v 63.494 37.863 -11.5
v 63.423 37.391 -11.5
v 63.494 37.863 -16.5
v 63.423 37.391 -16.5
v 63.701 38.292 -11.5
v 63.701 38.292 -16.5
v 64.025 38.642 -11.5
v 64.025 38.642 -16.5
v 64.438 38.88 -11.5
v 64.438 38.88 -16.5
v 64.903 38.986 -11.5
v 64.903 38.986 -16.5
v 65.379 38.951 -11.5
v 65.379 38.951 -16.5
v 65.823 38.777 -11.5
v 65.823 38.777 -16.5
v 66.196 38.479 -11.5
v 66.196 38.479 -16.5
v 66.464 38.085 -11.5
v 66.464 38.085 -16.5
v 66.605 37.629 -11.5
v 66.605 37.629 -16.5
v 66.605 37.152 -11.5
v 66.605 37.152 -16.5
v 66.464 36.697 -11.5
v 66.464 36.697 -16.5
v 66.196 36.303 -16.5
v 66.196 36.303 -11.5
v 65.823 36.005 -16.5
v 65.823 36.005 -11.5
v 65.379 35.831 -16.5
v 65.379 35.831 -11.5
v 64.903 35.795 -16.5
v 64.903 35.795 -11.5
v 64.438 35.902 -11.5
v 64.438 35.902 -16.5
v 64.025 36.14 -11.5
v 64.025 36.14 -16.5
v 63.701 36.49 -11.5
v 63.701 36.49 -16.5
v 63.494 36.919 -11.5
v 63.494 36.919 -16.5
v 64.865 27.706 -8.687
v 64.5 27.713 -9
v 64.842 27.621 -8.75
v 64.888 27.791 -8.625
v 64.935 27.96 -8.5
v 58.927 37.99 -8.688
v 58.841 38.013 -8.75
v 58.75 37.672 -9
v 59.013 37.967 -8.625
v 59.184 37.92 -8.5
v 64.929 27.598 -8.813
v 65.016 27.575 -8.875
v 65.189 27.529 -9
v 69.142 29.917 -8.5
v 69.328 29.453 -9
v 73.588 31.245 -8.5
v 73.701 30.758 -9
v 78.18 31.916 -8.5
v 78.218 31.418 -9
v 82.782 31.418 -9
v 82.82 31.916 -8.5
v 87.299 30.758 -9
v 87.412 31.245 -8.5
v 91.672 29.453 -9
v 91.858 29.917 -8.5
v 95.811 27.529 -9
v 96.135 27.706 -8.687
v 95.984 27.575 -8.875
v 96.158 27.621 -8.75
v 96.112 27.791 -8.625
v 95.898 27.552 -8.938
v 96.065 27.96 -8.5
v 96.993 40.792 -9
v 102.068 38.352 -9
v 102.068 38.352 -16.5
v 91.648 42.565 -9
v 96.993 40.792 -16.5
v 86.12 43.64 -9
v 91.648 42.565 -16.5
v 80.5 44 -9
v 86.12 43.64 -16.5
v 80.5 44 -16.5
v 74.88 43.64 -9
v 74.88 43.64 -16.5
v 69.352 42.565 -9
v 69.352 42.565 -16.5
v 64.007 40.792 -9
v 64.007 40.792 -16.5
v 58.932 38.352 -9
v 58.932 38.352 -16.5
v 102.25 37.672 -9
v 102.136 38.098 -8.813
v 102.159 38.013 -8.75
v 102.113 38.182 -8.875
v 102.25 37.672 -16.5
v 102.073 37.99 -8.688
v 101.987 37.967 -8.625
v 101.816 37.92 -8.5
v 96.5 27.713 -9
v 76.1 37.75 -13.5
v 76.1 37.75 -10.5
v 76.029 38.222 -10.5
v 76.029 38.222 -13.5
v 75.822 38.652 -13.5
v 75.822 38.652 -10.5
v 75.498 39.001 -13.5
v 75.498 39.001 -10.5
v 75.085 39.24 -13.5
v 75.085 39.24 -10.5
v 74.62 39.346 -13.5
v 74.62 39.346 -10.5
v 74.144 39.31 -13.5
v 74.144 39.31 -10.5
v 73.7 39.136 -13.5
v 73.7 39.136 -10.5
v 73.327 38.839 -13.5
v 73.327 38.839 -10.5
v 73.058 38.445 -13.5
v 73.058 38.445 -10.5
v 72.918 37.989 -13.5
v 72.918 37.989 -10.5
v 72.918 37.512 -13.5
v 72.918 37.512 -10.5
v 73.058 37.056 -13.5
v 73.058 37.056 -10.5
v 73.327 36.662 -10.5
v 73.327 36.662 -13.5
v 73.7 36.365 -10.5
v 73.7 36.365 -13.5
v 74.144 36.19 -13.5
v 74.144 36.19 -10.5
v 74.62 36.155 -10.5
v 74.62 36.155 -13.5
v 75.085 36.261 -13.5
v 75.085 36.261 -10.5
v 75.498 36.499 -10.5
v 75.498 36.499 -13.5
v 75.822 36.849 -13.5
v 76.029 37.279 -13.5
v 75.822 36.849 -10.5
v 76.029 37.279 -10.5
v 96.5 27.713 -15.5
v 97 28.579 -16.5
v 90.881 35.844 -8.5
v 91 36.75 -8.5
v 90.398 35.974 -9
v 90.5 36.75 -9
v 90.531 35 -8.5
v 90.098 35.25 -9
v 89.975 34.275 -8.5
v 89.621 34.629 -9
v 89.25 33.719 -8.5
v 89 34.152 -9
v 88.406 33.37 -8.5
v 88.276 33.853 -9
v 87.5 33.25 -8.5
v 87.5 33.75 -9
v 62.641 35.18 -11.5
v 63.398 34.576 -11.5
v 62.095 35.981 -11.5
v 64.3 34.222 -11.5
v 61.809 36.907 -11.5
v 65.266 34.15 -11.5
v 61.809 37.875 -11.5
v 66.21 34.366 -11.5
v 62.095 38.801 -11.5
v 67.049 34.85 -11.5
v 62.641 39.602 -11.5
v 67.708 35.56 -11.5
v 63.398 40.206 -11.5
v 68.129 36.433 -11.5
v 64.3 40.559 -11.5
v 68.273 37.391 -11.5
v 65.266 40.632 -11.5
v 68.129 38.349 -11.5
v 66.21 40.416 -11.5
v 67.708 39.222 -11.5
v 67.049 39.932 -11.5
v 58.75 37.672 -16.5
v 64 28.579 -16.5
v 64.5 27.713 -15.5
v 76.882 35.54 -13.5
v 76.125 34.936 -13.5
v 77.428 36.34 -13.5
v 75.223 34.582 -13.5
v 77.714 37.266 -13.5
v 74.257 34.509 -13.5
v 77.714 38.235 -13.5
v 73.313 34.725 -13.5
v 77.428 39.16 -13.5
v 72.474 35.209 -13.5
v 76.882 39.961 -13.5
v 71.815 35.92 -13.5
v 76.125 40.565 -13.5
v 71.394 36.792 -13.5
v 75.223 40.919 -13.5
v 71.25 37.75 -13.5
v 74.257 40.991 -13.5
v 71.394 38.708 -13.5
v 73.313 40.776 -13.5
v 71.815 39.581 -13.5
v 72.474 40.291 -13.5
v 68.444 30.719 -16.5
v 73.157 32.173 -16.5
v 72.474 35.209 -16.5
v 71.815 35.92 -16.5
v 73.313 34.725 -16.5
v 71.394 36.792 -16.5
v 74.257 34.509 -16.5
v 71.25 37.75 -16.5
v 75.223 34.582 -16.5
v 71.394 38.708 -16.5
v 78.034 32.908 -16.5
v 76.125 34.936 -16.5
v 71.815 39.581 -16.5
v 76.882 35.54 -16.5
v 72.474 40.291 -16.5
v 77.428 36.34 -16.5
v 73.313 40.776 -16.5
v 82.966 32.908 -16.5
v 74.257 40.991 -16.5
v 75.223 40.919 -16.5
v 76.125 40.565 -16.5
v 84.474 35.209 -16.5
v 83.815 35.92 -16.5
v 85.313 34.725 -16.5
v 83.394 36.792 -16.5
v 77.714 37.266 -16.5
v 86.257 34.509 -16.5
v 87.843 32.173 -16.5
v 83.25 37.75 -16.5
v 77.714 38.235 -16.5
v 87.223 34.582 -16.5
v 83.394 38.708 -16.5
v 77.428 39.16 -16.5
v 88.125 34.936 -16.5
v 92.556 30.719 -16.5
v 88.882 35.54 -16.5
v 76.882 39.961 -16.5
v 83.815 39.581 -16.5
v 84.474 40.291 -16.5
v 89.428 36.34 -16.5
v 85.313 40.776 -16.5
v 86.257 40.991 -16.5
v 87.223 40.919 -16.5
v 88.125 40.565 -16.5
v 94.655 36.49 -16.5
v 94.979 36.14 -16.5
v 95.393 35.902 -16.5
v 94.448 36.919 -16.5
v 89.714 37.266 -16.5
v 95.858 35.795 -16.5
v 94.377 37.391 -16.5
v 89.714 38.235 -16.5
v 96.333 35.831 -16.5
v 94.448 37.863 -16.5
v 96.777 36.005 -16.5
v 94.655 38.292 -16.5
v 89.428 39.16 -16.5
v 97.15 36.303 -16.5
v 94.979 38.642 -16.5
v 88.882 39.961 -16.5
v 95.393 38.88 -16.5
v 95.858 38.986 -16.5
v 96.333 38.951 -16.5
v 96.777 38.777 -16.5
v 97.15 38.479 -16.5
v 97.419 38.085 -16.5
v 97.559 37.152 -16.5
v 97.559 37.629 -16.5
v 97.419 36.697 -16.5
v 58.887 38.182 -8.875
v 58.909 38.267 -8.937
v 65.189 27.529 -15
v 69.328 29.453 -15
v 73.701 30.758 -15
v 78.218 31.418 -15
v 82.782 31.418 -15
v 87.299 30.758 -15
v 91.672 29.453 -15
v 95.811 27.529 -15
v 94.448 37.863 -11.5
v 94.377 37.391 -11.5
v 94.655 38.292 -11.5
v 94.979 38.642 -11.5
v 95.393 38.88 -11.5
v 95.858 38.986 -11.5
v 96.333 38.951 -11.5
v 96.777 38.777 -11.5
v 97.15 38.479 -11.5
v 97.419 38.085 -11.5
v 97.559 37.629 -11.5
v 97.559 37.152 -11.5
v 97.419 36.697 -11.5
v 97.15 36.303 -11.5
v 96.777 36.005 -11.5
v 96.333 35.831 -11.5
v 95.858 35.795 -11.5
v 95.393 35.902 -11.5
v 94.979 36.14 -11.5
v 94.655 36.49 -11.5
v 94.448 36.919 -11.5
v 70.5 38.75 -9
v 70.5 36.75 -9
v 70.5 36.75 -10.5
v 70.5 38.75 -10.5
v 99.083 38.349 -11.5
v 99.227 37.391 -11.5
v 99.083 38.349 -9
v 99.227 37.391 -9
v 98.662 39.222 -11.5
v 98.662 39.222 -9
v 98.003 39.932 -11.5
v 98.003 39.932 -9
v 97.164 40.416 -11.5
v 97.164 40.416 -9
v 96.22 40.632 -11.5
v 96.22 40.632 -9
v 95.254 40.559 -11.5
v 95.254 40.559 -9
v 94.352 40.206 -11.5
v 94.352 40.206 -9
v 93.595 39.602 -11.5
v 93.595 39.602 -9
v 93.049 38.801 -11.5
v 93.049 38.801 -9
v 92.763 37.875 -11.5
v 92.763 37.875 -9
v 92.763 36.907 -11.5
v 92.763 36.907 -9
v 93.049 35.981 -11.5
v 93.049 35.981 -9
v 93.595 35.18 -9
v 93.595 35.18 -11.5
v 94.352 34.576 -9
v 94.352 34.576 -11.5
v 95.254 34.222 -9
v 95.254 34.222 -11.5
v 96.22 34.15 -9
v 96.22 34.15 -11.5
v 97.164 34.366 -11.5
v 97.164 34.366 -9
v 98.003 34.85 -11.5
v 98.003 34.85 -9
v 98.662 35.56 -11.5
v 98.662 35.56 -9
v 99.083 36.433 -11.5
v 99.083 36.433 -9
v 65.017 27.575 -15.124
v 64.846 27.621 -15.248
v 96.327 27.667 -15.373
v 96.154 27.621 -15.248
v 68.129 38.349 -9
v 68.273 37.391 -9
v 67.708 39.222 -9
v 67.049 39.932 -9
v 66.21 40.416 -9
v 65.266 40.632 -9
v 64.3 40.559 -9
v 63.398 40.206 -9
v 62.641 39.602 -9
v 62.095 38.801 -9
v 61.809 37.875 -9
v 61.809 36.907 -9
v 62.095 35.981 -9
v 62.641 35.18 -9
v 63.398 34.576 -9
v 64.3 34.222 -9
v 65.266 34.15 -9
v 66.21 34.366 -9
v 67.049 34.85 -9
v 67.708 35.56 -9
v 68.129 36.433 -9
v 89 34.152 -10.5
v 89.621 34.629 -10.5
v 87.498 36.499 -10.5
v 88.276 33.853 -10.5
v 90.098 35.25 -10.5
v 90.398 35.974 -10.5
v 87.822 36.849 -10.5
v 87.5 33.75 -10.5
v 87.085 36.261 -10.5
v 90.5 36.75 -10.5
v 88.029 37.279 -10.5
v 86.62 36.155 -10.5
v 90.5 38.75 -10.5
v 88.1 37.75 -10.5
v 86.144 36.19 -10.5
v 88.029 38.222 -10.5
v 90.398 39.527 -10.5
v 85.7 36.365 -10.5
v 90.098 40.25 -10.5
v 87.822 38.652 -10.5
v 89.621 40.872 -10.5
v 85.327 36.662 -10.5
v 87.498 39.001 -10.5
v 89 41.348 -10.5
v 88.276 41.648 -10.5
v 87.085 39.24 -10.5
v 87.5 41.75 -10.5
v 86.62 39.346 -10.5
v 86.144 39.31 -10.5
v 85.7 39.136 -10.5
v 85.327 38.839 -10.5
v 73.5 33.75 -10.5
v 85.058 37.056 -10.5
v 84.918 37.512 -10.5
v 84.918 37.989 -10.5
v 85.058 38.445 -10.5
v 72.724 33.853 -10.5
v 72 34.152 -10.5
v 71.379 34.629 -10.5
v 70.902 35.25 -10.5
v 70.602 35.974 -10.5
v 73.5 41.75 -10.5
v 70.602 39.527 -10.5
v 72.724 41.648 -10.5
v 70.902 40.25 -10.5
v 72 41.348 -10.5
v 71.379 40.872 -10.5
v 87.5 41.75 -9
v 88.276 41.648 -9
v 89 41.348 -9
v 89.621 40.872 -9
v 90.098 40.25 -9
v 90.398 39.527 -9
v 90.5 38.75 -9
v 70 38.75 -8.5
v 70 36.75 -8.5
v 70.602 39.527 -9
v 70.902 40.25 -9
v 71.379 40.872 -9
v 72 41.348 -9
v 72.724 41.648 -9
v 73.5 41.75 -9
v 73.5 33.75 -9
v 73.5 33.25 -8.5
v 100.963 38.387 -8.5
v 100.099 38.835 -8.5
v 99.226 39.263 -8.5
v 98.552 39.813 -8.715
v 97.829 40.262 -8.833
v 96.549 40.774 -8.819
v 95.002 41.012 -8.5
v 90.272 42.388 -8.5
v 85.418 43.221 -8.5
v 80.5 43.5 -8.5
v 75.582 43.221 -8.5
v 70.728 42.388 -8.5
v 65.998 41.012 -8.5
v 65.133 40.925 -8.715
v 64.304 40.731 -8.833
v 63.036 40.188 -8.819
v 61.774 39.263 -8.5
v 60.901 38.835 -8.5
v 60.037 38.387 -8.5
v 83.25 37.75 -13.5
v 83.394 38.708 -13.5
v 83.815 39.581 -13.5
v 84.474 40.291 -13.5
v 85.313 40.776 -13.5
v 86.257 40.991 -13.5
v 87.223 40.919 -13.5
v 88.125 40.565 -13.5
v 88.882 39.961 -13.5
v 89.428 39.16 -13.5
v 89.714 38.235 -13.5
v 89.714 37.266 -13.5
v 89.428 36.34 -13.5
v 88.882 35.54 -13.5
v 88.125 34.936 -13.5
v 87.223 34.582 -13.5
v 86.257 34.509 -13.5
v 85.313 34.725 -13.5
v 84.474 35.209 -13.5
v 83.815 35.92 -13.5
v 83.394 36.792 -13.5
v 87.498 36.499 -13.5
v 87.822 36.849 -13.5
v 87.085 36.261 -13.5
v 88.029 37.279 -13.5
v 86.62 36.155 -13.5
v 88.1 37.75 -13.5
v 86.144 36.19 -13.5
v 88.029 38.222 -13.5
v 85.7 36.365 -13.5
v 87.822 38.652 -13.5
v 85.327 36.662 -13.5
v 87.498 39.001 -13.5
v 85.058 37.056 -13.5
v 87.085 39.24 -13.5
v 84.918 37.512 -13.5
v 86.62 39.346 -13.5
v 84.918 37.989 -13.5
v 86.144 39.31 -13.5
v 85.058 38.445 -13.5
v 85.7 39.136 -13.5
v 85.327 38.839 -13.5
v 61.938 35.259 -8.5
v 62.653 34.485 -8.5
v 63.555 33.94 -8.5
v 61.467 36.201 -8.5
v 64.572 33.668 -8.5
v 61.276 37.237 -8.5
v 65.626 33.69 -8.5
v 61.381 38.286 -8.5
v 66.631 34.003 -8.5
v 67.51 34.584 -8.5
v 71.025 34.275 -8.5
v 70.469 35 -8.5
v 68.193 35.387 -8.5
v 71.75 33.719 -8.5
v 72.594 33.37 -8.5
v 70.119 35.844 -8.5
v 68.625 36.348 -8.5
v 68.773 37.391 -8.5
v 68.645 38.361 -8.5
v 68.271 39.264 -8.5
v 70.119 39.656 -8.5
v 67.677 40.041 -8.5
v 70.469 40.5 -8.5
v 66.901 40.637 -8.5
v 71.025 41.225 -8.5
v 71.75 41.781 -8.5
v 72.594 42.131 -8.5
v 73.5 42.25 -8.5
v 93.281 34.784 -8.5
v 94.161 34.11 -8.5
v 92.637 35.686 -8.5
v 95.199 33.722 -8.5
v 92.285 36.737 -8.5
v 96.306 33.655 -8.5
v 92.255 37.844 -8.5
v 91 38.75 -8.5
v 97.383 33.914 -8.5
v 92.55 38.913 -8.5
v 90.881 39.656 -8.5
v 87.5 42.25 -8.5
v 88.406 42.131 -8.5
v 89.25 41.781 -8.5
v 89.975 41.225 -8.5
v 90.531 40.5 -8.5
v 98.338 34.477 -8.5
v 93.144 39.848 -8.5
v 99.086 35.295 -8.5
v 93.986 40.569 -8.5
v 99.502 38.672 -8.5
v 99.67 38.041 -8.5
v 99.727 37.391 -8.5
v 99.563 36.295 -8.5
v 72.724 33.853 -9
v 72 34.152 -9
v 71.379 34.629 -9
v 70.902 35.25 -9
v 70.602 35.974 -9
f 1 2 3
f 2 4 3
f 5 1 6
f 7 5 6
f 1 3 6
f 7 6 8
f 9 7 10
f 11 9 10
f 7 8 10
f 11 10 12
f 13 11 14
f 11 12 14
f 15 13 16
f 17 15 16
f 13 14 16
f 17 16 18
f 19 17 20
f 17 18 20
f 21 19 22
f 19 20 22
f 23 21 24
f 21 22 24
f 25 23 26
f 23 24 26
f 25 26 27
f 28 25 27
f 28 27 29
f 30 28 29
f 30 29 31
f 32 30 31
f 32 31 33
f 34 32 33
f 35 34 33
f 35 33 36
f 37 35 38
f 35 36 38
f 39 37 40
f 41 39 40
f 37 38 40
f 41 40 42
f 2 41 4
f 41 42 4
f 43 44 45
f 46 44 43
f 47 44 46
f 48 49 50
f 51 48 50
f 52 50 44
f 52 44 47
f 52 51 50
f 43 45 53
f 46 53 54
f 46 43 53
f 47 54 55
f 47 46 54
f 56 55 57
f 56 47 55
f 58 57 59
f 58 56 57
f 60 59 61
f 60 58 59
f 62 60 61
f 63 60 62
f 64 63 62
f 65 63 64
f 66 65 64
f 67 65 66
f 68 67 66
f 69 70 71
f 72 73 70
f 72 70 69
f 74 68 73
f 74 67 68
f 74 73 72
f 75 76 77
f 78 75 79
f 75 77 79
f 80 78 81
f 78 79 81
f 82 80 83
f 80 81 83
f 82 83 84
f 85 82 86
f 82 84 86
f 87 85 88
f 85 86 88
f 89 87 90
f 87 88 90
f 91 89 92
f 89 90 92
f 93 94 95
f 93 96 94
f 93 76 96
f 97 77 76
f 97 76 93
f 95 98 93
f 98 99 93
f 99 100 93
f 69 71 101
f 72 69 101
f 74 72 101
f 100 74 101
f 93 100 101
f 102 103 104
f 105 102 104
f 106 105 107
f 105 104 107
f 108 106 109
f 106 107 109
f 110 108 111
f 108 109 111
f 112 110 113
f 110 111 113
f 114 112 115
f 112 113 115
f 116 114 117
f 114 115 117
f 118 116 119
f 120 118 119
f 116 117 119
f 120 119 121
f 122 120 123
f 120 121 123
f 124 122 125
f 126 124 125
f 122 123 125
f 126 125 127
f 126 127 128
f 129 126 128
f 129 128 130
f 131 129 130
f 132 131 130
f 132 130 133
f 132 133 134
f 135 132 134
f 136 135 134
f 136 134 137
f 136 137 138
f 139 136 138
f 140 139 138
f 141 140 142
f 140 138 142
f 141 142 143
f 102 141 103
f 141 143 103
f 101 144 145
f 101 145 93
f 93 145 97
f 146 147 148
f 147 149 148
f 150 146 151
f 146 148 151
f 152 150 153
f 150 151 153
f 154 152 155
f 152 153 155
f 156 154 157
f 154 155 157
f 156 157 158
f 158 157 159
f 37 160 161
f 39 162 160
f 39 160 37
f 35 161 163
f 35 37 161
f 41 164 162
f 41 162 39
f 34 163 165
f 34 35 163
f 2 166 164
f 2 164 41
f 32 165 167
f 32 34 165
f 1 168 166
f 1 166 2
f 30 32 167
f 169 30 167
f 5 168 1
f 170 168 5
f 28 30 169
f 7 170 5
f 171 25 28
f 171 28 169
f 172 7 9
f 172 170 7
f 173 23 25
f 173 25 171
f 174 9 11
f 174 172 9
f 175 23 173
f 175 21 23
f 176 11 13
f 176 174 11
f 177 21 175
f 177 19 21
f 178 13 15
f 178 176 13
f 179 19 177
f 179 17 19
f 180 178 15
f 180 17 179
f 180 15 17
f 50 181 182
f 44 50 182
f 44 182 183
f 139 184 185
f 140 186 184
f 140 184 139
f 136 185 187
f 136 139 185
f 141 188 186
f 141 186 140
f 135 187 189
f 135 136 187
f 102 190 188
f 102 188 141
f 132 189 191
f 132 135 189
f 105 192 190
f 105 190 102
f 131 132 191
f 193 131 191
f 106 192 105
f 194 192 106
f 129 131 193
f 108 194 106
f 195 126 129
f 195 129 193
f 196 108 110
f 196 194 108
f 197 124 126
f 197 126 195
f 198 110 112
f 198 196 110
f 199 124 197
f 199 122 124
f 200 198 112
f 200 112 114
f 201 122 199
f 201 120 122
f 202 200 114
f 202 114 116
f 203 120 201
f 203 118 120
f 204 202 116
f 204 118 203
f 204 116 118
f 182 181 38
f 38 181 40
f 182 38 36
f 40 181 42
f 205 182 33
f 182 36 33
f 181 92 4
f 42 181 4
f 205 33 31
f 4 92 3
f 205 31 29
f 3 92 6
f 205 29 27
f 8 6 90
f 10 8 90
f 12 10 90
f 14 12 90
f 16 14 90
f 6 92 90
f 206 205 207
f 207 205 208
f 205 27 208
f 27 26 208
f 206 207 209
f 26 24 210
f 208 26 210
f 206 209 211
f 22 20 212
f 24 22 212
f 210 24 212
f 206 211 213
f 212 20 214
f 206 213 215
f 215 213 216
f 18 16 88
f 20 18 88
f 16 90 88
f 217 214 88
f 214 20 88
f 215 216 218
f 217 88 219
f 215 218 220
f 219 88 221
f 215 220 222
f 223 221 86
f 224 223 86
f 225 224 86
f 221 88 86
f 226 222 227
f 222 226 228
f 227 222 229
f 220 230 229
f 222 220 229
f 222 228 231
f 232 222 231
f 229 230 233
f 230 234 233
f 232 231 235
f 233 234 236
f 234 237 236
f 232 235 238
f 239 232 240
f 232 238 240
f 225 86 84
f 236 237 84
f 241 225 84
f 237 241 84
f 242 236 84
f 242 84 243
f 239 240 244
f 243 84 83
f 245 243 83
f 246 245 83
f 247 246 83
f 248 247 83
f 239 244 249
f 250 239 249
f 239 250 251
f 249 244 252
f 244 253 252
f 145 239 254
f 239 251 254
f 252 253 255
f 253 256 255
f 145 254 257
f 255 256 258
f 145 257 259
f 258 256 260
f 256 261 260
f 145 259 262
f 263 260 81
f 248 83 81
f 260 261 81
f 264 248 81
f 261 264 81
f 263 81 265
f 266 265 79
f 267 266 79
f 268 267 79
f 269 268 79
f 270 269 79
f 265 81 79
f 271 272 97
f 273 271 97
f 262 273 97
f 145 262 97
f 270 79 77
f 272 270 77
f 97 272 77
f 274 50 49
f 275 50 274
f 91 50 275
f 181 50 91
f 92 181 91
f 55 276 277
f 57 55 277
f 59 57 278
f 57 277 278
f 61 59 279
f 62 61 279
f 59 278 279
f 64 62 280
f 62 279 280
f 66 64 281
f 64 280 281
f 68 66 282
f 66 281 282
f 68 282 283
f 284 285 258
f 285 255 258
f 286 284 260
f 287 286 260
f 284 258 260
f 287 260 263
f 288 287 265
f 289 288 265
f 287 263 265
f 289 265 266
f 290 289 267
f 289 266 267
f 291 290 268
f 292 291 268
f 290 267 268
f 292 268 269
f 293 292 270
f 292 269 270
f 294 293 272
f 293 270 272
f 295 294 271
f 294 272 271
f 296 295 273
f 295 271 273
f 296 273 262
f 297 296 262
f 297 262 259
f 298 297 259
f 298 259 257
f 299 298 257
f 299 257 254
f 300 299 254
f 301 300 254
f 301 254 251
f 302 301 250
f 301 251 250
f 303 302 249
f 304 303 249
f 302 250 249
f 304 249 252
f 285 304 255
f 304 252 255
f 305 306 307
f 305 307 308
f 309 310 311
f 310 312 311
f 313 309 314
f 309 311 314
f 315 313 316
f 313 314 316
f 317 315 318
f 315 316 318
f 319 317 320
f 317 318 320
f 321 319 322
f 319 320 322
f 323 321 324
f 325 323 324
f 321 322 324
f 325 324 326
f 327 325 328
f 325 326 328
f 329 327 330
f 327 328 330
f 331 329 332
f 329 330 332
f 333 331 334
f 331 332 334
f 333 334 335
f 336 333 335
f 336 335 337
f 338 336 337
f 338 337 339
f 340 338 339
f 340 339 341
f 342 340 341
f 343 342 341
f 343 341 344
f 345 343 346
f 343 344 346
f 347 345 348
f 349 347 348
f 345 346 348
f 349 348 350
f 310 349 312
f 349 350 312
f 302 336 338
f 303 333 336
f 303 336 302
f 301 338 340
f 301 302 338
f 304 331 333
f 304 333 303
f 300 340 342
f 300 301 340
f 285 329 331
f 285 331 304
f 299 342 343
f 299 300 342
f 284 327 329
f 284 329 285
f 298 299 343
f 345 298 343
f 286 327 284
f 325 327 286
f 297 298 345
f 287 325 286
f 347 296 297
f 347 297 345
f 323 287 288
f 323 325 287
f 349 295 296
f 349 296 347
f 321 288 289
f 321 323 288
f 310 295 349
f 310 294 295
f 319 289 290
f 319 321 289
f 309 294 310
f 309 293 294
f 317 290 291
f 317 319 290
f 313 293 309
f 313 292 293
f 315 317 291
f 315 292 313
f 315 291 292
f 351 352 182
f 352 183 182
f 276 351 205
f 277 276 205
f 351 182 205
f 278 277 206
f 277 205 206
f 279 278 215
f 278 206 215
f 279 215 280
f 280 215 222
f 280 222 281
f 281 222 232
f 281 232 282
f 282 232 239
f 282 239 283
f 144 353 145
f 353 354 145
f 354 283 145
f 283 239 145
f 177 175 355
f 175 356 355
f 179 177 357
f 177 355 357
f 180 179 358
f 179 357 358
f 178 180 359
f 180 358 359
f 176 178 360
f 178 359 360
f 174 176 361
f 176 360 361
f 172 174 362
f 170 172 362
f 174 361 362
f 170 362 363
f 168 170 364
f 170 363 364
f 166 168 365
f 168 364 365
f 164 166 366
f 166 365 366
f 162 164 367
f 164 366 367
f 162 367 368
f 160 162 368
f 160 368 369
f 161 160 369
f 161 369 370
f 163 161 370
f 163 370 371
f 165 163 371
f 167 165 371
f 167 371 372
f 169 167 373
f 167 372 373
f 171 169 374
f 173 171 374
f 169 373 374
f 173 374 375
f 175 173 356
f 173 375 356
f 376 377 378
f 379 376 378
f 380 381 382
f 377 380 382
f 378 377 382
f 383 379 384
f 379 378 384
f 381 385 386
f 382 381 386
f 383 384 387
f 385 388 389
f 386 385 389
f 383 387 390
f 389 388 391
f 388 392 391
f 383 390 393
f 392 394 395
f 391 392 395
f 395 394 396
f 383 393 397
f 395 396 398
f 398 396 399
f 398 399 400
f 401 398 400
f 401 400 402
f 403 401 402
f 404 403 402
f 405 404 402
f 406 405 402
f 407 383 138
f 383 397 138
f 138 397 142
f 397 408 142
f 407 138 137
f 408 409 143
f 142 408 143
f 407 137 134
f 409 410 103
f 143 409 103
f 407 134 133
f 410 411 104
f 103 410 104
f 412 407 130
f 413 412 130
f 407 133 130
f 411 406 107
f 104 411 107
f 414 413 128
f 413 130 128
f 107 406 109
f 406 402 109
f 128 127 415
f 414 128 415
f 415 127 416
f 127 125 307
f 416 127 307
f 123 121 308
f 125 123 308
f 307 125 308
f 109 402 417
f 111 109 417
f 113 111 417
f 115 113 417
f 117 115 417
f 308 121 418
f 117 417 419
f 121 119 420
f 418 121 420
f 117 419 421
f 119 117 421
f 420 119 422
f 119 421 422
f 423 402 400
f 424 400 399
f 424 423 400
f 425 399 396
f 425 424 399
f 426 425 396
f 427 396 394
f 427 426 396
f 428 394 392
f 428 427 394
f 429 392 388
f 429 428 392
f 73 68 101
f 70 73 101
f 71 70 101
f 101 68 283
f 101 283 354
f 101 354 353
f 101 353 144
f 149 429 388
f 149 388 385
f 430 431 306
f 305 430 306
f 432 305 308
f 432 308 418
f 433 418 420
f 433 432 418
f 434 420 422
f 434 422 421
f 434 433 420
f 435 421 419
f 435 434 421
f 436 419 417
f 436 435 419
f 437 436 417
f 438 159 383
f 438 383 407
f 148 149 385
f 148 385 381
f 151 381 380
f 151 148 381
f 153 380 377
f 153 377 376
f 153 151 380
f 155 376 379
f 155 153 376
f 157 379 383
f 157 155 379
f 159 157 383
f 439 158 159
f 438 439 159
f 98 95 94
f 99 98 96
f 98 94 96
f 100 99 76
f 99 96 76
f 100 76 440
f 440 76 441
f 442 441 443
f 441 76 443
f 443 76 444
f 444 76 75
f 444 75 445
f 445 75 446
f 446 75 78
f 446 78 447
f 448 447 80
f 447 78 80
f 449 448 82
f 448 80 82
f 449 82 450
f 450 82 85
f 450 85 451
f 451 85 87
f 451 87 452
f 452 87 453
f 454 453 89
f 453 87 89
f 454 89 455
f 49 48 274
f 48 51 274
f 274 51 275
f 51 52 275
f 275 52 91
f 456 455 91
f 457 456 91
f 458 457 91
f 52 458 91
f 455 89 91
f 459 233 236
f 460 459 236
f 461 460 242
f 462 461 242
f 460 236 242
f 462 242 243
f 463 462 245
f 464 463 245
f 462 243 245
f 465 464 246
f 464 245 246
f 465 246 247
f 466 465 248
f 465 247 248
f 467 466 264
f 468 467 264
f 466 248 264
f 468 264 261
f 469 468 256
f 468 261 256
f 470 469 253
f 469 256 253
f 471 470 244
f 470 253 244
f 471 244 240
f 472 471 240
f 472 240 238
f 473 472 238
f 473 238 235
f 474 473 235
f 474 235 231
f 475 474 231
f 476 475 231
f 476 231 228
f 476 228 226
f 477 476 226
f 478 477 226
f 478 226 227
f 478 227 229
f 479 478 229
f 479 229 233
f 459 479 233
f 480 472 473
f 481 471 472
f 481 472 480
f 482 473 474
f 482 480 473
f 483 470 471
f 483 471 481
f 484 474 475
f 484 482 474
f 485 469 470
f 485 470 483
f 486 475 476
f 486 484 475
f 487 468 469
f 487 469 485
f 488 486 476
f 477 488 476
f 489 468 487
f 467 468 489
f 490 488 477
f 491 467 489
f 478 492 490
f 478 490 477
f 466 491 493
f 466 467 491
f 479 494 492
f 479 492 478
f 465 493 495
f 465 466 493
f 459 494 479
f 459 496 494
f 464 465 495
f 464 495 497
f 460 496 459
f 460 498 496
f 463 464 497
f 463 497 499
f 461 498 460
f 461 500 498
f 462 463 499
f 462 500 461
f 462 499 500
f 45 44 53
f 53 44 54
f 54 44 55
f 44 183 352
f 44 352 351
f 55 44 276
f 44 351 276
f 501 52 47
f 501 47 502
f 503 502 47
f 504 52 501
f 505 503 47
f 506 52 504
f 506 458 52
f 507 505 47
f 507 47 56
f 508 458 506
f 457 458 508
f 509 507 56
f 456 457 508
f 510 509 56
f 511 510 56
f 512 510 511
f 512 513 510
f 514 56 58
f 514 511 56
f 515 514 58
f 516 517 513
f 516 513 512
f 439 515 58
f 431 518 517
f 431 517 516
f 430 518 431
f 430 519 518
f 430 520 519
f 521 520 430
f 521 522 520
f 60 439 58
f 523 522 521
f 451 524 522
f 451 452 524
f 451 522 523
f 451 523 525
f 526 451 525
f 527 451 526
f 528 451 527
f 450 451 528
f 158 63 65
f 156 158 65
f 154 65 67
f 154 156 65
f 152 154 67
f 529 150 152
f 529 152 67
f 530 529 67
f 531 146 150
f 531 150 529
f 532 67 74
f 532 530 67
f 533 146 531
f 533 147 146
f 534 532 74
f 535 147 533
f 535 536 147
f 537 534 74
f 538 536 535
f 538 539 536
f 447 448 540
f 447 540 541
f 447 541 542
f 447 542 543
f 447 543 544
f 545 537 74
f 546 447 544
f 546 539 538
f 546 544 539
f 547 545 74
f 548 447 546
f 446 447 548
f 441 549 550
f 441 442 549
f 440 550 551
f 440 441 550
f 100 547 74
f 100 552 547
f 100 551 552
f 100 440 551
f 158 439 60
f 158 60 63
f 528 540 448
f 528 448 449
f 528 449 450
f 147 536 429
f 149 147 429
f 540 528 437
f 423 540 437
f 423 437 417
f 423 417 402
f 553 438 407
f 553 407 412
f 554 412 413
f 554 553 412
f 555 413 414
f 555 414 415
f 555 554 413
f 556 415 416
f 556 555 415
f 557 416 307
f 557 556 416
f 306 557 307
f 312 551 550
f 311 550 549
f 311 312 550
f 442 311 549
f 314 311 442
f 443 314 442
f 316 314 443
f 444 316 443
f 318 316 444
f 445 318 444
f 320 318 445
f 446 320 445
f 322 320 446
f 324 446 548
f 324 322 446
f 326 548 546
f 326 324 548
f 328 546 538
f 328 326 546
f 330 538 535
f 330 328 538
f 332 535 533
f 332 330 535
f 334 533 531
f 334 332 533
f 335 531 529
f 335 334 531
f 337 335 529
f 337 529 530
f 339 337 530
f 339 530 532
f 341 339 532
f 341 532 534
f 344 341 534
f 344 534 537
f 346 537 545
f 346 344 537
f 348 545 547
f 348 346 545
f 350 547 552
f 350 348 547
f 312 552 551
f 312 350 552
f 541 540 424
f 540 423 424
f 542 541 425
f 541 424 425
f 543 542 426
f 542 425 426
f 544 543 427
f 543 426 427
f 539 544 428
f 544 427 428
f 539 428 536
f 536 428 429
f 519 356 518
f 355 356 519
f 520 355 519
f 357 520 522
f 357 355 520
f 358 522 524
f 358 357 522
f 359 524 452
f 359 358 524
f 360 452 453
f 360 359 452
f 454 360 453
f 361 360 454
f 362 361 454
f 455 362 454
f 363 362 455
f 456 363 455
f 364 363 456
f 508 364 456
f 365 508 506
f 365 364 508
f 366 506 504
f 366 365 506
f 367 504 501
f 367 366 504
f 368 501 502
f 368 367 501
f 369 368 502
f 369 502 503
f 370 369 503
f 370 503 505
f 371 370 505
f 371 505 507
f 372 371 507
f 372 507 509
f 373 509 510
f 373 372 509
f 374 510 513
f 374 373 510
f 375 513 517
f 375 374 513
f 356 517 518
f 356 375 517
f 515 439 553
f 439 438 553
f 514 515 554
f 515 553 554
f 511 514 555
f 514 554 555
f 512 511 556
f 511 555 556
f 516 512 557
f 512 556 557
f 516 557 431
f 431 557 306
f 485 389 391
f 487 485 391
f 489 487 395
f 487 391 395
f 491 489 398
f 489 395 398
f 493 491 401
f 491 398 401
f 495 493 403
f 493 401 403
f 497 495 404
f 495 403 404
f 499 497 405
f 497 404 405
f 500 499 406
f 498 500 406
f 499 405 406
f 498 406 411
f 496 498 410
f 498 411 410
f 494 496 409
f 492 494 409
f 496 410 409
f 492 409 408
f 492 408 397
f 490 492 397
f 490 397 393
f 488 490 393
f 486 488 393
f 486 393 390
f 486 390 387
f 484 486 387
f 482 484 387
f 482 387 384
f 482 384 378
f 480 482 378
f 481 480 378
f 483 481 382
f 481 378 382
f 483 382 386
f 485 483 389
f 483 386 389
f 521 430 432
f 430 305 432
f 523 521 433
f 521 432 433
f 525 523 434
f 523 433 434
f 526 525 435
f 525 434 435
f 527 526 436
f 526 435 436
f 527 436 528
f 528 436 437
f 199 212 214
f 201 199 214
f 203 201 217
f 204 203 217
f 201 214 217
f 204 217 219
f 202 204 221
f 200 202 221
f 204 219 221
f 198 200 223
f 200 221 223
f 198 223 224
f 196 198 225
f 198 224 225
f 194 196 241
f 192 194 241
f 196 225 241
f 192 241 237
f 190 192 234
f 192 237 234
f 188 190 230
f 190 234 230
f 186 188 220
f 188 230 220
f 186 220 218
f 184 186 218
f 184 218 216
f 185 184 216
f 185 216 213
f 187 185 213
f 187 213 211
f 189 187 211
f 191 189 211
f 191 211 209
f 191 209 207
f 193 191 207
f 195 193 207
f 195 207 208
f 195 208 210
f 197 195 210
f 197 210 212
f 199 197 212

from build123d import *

# Parameters (mm, degrees)
EXTRUDE_1_DEPTH              = 8
CHAMFER_7_SIZE               = 1.5
HOLE_WIZARD_M3_1_D           = 3.2
HOLE_WIZARD_M3_1_CBORE_D     = 6.5
HOLE_WIZARD_M3_1_CBORE_DEPTH = 3
HOLE_WIZARD_M3_2_D           = 3.2
HOLE_WIZARD_M3_2_CBORE_D     = 6.5
HOLE_WIZARD_M3_2_CBORE_DEPTH = 3
CUT_EXTRUDE_6_DEPTH          = 2
CHAMFER_8_SIZE               = 0.5
CHAMFER_9_SIZE               = 0.5


with BuildPart() as part:
    # ｽｹｯﾁ3 → ﾎﾞｽ - 押し出し1 (new body)
    with BuildSketch(Plane.XY.offset(-16.5)):
        with BuildLine():
            Line((58.49999999, 38.105482977), (64.74999999, 27.280165429))
            ThreePointArc((64.74999999, 27.280165429), (80.49999999, 31.50036521), (96.24999999, 27.280165429))
            Line((96.24999999, 27.280165429), (102.49999999, 38.105482977))
            ThreePointArc((102.49999999, 38.105482977), (80.49999999, 44.00036521), (58.49999999, 38.105482977))
        make_face()
    extrude(amount=EXTRUDE_1_DEPTH)

    # 面取り7
    chamfer_7_edges = [part.edges().sort_by_distance(p)[0] for p in [
        (80.49999999, 31.50036521, -16.5),
    ]]
    chamfer(chamfer_7_edges, length=CHAMFER_7_SIZE)

    # M3 穴付きねじ用座ぐり穴1 (through all)
    with Locations(Plane.XY.offset(-8.5)):
        with Locations((65.0229264, 37.390950693), (95.977073581, 37.390950693)):
            CounterBoreHole(HOLE_WIZARD_M3_1_D / 2, HOLE_WIZARD_M3_1_CBORE_D / 2, HOLE_WIZARD_M3_1_CBORE_DEPTH)

    # M3 穴付きねじ用座ぐり穴2 (through all)
    with Locations(Plane(origin=(0, 0, -16.5), x_dir=(-1, 0, 0), z_dir=(0, 0, -1))):
        with Locations((-86.49999999, 37.75036521), (-74.49999999, 37.75036521)):
            CounterBoreHole(HOLE_WIZARD_M3_2_D / 2, HOLE_WIZARD_M3_2_CBORE_D / 2, HOLE_WIZARD_M3_2_CBORE_DEPTH)

    # ｽｹｯﾁ17 → ｶｯﾄ - 押し出し6 (cut)
    with BuildSketch(Plane.XY.offset(-8.5)):
        with BuildLine():
            Line((73.49999999, 41.75036521), (87.49999999, 41.75036521))
            ThreePointArc((87.49999999, 41.75036521), (89.621320334, 40.871685554), (90.49999999, 38.75036521))
            Line((90.49999999, 38.75036521), (90.49999999, 36.75036521))
            ThreePointArc((90.49999999, 36.75036521), (89.621320334, 34.629044867), (87.49999999, 33.75036521))
            Line((87.49999999, 33.75036521), (73.49999999, 33.75036521))
            ThreePointArc((73.49999999, 33.75036521), (71.378679647, 34.629044867), (70.49999999, 36.75036521))
            Line((70.49999999, 36.75036521), (70.49999999, 38.75036521))
            ThreePointArc((70.49999999, 38.75036521), (71.378679647, 40.871685554), (73.49999999, 41.75036521))
        make_face()
    extrude(amount=-CUT_EXTRUDE_6_DEPTH, mode=Mode.SUBTRACT)

    # 面取り8
    # the kernel refuses this chamfer: 0.5 mm, written as the material it takes off along each edge
    with BuildSketch(Plane(origin=(80.49999999, 0.00036521, -8.5), x_dir=(-0.5349312949950591, 0.844895561377209, 0), z_dir=(-0.844895561377209, -0.5349312949950591, 0))) as chamfer_8_piece_1:
        Polygon((31.5, CHAMFER_8_SIZE), (31.5 + CHAMFER_8_SIZE, 0), (31.5, 0), align=None)
    revolve(axis=Axis((80.49999999, 0.00036521, -8.5), (0, 0, -1)), revolution_arc=64.678504259, mode=Mode.SUBTRACT)
    with BuildSketch(Plane(origin=(95.607079243, 26.16659403, -8.5), x_dir=(-0.8660254037844379, 0.5000000000000012, 0), z_dir=(0.5000000000000012, 0.866025403784438, 0))) as chamfer_8_piece_2:
        Polygon((CHAMFER_8_SIZE, 0), (0, -CHAMFER_8_SIZE), (0, 0), align=None)
    extrude(amount=15.071682988, mode=Mode.SUBTRACT)
    with BuildSketch(Plane(origin=(80.49999999, 0.00036521, -8.5), x_dir=(0.5250957878127545, 0.8510431326444641, 0), z_dir=(0.8510431326444641, -0.5250957878127545, 0))) as chamfer_8_piece_3:
        Polygon((44 - CHAMFER_8_SIZE, 0), (44, -CHAMFER_8_SIZE), (44, 0), align=None)
    revolve(axis=Axis((80.49999999, 0.00036521, -8.5), (0, 0, 1)), revolution_arc=63.349383731, mode=Mode.SUBTRACT)
    with BuildSketch(Plane(origin=(95.977073581, 37.390950693, -8.5), x_dir=(1, 0, 0), z_dir=(0, -1, 0))) as chamfer_8_piece_4:
        Polygon((3.25 + CHAMFER_8_SIZE, 0), (3.25, -CHAMFER_8_SIZE), (3.25, 0), align=None)
    revolve(axis=Axis((95.977073581, 37.390950693, -8.5), (0, 0, 1)), mode=Mode.SUBTRACT)
    with BuildSketch(Plane(origin=(65.0229264, 37.390950693, -8.5), x_dir=(1, 0, 0), z_dir=(0, -1, 0))) as chamfer_8_piece_5:
        Polygon((3.25 + CHAMFER_8_SIZE, 0), (3.25, -CHAMFER_8_SIZE), (3.25, 0), align=None)
    revolve(axis=Axis((65.0229264, 37.390950693, -8.5), (0, 0, 1)), mode=Mode.SUBTRACT)
    with BuildSketch(Plane(origin=(57.857079243, 39.219054376, -8.5), x_dir=(0, 0, -1), z_dir=(0.5000000000000007, -0.8660254037844384, 0))) as chamfer_8_piece_6:
        Polygon((CHAMFER_8_SIZE, 0), (0, CHAMFER_8_SIZE), (0, 0), align=None)
    extrude(amount=15.071682988, mode=Mode.SUBTRACT)
    with BuildSketch(Plane(origin=(87.49999999, 38.75036521, -8.5), x_dir=(0, 1, 0), z_dir=(-1, 0, 0))) as chamfer_8_piece_7:
        Polygon((3 + CHAMFER_8_SIZE, 0), (3, CHAMFER_8_SIZE), (3, 0), align=None)
    revolve(axis=Axis((87.49999999, 38.75036521, -8.5), (0, 0, -1)), revolution_arc=90, mode=Mode.SUBTRACT)
    with BuildSketch(Plane(origin=(73.49999999, 41.75036521, -8.5), x_dir=(0, 1, 0), z_dir=(1, 0, 0)), Plane(origin=(87.49999999, 33.75036521, -8.5), x_dir=(0, -1, 0), z_dir=(-1, 0, 0))) as chamfer_8_piece_8:
        Polygon((CHAMFER_8_SIZE, 0), (0, -CHAMFER_8_SIZE), (0, 0), align=None)
    extrude(amount=14, mode=Mode.SUBTRACT)
    with BuildSketch(Plane(origin=(73.49999999, 38.75036521, -8.5), x_dir=(-1, 0, 0), z_dir=(0, -1, 0))) as chamfer_8_piece_9:
        Polygon((3 + CHAMFER_8_SIZE, 0), (3, CHAMFER_8_SIZE), (3, 0), align=None)
    revolve(axis=Axis((73.49999999, 38.75036521, -8.5), (0, 0, -1)), revolution_arc=90, mode=Mode.SUBTRACT)
    with BuildSketch(Plane(origin=(70.49999999, 36.75036521, -8.5), x_dir=(-1, 0, 0), z_dir=(0, 1, 0)), Plane(origin=(90.49999999, 38.75036521, -8.5), x_dir=(1, 0, 0), z_dir=(0, -1, 0))) as chamfer_8_piece_10:
        Polygon((CHAMFER_8_SIZE, 0), (0, -CHAMFER_8_SIZE), (0, 0), align=None)
    extrude(amount=2, mode=Mode.SUBTRACT)
    with BuildSketch(Plane(origin=(73.49999999, 36.75036521, -8.5), x_dir=(0, -1, 0), z_dir=(1, 0, 0))) as chamfer_8_piece_11:
        Polygon((3 + CHAMFER_8_SIZE, 0), (3, CHAMFER_8_SIZE), (3, 0), align=None)
    revolve(axis=Axis((73.49999999, 36.75036521, -8.5), (0, 0, -1)), revolution_arc=90, mode=Mode.SUBTRACT)
    with BuildSketch(Plane(origin=(87.49999999, 36.75036521, -8.5), x_dir=(1, 0, 0), z_dir=(0, 1, 0))) as chamfer_8_piece_12:
        Polygon((3 + CHAMFER_8_SIZE, 0), (3, CHAMFER_8_SIZE), (3, 0), align=None)
    revolve(axis=Axis((87.49999999, 36.75036521, -8.5), (0, 0, -1)), revolution_arc=90, mode=Mode.SUBTRACT)

    # 面取り9
    # the kernel refuses this chamfer: 0.5 mm, written as the material it takes off along each edge
    with BuildSketch(Plane(origin=(96.24999999, 27.280165429, -16.296233904), x_dir=(-0.8699980733677616, 0.4930551209919465, 0), z_dir=(0, 0, 1))) as chamfer_9_piece_1:
        with BuildLine():
            Line((0.504048916, 0), (-CHAMFER_9_SIZE * 0.00800077643885, -CHAMFER_9_SIZE * 0.999967993276))
            Line((-CHAMFER_9_SIZE * 0.00800077643885, -CHAMFER_9_SIZE * 0.999967993276), (0, 0))
            ThreePointArc((0, 0), (0.259153689, -0.001007405), (0.504048916, 0))
        make_face()
    extrude(amount=8.592467809, mode=Mode.SUBTRACT)
    with BuildSketch(Plane(origin=(64.74999999, 27.280165429, -16.296233904), x_dir=(-0.499999999999999, 0.8660254037844393, 0), z_dir=(0, 0, 1))) as chamfer_9_piece_2:
        with BuildLine():
            Line((CHAMFER_9_SIZE, 0), (-0.004032783, -0.504032783))
            ThreePointArc((-0.004032783, -0.504032783), (-0.001066058, -0.259153454), (0, 0))
            Line((0, 0), (CHAMFER_9_SIZE, 0))
        make_face()
    extrude(amount=8.592467809, mode=Mode.SUBTRACT)
    with BuildSketch(Plane(origin=(58.49999999, 38.105482977, -17.785841494), x_dir=(0.5000000000000021, -0.8660254037844375, 0), z_dir=(0, 0, 1))) as chamfer_9_piece_3:
        with BuildLine():
            Line((CHAMFER_9_SIZE, 0), (0.002809166, 0.497190834))
            ThreePointArc((0.002809166, 0.497190834), (0.000742578, 0.255629249), (0, 0))
            Line((0, 0), (CHAMFER_9_SIZE, 0))
        make_face()
    extrude(amount=10.071682988, mode=Mode.SUBTRACT)
    with BuildSketch(Plane(origin=(102.49999999, 38.105482977, -17.785841494), x_dir=(-0.8688365739050292, 0.4950989879256175, 0), z_dir=(0, 0, 1))) as chamfer_9_piece_4:
        with BuildLine():
            Line((0.49719877, 0), (CHAMFER_9_SIZE * 0.00564998602096, CHAMFER_9_SIZE * 0.999984038702))
            Line((CHAMFER_9_SIZE * 0.00564998602096, CHAMFER_9_SIZE * 0.999984038702), (0, 0))
            ThreePointArc((0, 0), (0.255629364, -0.000701736), (0.49719877, 0))
        make_face()
    extrude(amount=10.071682988, mode=Mode.SUBTRACT)


solid = part.part
